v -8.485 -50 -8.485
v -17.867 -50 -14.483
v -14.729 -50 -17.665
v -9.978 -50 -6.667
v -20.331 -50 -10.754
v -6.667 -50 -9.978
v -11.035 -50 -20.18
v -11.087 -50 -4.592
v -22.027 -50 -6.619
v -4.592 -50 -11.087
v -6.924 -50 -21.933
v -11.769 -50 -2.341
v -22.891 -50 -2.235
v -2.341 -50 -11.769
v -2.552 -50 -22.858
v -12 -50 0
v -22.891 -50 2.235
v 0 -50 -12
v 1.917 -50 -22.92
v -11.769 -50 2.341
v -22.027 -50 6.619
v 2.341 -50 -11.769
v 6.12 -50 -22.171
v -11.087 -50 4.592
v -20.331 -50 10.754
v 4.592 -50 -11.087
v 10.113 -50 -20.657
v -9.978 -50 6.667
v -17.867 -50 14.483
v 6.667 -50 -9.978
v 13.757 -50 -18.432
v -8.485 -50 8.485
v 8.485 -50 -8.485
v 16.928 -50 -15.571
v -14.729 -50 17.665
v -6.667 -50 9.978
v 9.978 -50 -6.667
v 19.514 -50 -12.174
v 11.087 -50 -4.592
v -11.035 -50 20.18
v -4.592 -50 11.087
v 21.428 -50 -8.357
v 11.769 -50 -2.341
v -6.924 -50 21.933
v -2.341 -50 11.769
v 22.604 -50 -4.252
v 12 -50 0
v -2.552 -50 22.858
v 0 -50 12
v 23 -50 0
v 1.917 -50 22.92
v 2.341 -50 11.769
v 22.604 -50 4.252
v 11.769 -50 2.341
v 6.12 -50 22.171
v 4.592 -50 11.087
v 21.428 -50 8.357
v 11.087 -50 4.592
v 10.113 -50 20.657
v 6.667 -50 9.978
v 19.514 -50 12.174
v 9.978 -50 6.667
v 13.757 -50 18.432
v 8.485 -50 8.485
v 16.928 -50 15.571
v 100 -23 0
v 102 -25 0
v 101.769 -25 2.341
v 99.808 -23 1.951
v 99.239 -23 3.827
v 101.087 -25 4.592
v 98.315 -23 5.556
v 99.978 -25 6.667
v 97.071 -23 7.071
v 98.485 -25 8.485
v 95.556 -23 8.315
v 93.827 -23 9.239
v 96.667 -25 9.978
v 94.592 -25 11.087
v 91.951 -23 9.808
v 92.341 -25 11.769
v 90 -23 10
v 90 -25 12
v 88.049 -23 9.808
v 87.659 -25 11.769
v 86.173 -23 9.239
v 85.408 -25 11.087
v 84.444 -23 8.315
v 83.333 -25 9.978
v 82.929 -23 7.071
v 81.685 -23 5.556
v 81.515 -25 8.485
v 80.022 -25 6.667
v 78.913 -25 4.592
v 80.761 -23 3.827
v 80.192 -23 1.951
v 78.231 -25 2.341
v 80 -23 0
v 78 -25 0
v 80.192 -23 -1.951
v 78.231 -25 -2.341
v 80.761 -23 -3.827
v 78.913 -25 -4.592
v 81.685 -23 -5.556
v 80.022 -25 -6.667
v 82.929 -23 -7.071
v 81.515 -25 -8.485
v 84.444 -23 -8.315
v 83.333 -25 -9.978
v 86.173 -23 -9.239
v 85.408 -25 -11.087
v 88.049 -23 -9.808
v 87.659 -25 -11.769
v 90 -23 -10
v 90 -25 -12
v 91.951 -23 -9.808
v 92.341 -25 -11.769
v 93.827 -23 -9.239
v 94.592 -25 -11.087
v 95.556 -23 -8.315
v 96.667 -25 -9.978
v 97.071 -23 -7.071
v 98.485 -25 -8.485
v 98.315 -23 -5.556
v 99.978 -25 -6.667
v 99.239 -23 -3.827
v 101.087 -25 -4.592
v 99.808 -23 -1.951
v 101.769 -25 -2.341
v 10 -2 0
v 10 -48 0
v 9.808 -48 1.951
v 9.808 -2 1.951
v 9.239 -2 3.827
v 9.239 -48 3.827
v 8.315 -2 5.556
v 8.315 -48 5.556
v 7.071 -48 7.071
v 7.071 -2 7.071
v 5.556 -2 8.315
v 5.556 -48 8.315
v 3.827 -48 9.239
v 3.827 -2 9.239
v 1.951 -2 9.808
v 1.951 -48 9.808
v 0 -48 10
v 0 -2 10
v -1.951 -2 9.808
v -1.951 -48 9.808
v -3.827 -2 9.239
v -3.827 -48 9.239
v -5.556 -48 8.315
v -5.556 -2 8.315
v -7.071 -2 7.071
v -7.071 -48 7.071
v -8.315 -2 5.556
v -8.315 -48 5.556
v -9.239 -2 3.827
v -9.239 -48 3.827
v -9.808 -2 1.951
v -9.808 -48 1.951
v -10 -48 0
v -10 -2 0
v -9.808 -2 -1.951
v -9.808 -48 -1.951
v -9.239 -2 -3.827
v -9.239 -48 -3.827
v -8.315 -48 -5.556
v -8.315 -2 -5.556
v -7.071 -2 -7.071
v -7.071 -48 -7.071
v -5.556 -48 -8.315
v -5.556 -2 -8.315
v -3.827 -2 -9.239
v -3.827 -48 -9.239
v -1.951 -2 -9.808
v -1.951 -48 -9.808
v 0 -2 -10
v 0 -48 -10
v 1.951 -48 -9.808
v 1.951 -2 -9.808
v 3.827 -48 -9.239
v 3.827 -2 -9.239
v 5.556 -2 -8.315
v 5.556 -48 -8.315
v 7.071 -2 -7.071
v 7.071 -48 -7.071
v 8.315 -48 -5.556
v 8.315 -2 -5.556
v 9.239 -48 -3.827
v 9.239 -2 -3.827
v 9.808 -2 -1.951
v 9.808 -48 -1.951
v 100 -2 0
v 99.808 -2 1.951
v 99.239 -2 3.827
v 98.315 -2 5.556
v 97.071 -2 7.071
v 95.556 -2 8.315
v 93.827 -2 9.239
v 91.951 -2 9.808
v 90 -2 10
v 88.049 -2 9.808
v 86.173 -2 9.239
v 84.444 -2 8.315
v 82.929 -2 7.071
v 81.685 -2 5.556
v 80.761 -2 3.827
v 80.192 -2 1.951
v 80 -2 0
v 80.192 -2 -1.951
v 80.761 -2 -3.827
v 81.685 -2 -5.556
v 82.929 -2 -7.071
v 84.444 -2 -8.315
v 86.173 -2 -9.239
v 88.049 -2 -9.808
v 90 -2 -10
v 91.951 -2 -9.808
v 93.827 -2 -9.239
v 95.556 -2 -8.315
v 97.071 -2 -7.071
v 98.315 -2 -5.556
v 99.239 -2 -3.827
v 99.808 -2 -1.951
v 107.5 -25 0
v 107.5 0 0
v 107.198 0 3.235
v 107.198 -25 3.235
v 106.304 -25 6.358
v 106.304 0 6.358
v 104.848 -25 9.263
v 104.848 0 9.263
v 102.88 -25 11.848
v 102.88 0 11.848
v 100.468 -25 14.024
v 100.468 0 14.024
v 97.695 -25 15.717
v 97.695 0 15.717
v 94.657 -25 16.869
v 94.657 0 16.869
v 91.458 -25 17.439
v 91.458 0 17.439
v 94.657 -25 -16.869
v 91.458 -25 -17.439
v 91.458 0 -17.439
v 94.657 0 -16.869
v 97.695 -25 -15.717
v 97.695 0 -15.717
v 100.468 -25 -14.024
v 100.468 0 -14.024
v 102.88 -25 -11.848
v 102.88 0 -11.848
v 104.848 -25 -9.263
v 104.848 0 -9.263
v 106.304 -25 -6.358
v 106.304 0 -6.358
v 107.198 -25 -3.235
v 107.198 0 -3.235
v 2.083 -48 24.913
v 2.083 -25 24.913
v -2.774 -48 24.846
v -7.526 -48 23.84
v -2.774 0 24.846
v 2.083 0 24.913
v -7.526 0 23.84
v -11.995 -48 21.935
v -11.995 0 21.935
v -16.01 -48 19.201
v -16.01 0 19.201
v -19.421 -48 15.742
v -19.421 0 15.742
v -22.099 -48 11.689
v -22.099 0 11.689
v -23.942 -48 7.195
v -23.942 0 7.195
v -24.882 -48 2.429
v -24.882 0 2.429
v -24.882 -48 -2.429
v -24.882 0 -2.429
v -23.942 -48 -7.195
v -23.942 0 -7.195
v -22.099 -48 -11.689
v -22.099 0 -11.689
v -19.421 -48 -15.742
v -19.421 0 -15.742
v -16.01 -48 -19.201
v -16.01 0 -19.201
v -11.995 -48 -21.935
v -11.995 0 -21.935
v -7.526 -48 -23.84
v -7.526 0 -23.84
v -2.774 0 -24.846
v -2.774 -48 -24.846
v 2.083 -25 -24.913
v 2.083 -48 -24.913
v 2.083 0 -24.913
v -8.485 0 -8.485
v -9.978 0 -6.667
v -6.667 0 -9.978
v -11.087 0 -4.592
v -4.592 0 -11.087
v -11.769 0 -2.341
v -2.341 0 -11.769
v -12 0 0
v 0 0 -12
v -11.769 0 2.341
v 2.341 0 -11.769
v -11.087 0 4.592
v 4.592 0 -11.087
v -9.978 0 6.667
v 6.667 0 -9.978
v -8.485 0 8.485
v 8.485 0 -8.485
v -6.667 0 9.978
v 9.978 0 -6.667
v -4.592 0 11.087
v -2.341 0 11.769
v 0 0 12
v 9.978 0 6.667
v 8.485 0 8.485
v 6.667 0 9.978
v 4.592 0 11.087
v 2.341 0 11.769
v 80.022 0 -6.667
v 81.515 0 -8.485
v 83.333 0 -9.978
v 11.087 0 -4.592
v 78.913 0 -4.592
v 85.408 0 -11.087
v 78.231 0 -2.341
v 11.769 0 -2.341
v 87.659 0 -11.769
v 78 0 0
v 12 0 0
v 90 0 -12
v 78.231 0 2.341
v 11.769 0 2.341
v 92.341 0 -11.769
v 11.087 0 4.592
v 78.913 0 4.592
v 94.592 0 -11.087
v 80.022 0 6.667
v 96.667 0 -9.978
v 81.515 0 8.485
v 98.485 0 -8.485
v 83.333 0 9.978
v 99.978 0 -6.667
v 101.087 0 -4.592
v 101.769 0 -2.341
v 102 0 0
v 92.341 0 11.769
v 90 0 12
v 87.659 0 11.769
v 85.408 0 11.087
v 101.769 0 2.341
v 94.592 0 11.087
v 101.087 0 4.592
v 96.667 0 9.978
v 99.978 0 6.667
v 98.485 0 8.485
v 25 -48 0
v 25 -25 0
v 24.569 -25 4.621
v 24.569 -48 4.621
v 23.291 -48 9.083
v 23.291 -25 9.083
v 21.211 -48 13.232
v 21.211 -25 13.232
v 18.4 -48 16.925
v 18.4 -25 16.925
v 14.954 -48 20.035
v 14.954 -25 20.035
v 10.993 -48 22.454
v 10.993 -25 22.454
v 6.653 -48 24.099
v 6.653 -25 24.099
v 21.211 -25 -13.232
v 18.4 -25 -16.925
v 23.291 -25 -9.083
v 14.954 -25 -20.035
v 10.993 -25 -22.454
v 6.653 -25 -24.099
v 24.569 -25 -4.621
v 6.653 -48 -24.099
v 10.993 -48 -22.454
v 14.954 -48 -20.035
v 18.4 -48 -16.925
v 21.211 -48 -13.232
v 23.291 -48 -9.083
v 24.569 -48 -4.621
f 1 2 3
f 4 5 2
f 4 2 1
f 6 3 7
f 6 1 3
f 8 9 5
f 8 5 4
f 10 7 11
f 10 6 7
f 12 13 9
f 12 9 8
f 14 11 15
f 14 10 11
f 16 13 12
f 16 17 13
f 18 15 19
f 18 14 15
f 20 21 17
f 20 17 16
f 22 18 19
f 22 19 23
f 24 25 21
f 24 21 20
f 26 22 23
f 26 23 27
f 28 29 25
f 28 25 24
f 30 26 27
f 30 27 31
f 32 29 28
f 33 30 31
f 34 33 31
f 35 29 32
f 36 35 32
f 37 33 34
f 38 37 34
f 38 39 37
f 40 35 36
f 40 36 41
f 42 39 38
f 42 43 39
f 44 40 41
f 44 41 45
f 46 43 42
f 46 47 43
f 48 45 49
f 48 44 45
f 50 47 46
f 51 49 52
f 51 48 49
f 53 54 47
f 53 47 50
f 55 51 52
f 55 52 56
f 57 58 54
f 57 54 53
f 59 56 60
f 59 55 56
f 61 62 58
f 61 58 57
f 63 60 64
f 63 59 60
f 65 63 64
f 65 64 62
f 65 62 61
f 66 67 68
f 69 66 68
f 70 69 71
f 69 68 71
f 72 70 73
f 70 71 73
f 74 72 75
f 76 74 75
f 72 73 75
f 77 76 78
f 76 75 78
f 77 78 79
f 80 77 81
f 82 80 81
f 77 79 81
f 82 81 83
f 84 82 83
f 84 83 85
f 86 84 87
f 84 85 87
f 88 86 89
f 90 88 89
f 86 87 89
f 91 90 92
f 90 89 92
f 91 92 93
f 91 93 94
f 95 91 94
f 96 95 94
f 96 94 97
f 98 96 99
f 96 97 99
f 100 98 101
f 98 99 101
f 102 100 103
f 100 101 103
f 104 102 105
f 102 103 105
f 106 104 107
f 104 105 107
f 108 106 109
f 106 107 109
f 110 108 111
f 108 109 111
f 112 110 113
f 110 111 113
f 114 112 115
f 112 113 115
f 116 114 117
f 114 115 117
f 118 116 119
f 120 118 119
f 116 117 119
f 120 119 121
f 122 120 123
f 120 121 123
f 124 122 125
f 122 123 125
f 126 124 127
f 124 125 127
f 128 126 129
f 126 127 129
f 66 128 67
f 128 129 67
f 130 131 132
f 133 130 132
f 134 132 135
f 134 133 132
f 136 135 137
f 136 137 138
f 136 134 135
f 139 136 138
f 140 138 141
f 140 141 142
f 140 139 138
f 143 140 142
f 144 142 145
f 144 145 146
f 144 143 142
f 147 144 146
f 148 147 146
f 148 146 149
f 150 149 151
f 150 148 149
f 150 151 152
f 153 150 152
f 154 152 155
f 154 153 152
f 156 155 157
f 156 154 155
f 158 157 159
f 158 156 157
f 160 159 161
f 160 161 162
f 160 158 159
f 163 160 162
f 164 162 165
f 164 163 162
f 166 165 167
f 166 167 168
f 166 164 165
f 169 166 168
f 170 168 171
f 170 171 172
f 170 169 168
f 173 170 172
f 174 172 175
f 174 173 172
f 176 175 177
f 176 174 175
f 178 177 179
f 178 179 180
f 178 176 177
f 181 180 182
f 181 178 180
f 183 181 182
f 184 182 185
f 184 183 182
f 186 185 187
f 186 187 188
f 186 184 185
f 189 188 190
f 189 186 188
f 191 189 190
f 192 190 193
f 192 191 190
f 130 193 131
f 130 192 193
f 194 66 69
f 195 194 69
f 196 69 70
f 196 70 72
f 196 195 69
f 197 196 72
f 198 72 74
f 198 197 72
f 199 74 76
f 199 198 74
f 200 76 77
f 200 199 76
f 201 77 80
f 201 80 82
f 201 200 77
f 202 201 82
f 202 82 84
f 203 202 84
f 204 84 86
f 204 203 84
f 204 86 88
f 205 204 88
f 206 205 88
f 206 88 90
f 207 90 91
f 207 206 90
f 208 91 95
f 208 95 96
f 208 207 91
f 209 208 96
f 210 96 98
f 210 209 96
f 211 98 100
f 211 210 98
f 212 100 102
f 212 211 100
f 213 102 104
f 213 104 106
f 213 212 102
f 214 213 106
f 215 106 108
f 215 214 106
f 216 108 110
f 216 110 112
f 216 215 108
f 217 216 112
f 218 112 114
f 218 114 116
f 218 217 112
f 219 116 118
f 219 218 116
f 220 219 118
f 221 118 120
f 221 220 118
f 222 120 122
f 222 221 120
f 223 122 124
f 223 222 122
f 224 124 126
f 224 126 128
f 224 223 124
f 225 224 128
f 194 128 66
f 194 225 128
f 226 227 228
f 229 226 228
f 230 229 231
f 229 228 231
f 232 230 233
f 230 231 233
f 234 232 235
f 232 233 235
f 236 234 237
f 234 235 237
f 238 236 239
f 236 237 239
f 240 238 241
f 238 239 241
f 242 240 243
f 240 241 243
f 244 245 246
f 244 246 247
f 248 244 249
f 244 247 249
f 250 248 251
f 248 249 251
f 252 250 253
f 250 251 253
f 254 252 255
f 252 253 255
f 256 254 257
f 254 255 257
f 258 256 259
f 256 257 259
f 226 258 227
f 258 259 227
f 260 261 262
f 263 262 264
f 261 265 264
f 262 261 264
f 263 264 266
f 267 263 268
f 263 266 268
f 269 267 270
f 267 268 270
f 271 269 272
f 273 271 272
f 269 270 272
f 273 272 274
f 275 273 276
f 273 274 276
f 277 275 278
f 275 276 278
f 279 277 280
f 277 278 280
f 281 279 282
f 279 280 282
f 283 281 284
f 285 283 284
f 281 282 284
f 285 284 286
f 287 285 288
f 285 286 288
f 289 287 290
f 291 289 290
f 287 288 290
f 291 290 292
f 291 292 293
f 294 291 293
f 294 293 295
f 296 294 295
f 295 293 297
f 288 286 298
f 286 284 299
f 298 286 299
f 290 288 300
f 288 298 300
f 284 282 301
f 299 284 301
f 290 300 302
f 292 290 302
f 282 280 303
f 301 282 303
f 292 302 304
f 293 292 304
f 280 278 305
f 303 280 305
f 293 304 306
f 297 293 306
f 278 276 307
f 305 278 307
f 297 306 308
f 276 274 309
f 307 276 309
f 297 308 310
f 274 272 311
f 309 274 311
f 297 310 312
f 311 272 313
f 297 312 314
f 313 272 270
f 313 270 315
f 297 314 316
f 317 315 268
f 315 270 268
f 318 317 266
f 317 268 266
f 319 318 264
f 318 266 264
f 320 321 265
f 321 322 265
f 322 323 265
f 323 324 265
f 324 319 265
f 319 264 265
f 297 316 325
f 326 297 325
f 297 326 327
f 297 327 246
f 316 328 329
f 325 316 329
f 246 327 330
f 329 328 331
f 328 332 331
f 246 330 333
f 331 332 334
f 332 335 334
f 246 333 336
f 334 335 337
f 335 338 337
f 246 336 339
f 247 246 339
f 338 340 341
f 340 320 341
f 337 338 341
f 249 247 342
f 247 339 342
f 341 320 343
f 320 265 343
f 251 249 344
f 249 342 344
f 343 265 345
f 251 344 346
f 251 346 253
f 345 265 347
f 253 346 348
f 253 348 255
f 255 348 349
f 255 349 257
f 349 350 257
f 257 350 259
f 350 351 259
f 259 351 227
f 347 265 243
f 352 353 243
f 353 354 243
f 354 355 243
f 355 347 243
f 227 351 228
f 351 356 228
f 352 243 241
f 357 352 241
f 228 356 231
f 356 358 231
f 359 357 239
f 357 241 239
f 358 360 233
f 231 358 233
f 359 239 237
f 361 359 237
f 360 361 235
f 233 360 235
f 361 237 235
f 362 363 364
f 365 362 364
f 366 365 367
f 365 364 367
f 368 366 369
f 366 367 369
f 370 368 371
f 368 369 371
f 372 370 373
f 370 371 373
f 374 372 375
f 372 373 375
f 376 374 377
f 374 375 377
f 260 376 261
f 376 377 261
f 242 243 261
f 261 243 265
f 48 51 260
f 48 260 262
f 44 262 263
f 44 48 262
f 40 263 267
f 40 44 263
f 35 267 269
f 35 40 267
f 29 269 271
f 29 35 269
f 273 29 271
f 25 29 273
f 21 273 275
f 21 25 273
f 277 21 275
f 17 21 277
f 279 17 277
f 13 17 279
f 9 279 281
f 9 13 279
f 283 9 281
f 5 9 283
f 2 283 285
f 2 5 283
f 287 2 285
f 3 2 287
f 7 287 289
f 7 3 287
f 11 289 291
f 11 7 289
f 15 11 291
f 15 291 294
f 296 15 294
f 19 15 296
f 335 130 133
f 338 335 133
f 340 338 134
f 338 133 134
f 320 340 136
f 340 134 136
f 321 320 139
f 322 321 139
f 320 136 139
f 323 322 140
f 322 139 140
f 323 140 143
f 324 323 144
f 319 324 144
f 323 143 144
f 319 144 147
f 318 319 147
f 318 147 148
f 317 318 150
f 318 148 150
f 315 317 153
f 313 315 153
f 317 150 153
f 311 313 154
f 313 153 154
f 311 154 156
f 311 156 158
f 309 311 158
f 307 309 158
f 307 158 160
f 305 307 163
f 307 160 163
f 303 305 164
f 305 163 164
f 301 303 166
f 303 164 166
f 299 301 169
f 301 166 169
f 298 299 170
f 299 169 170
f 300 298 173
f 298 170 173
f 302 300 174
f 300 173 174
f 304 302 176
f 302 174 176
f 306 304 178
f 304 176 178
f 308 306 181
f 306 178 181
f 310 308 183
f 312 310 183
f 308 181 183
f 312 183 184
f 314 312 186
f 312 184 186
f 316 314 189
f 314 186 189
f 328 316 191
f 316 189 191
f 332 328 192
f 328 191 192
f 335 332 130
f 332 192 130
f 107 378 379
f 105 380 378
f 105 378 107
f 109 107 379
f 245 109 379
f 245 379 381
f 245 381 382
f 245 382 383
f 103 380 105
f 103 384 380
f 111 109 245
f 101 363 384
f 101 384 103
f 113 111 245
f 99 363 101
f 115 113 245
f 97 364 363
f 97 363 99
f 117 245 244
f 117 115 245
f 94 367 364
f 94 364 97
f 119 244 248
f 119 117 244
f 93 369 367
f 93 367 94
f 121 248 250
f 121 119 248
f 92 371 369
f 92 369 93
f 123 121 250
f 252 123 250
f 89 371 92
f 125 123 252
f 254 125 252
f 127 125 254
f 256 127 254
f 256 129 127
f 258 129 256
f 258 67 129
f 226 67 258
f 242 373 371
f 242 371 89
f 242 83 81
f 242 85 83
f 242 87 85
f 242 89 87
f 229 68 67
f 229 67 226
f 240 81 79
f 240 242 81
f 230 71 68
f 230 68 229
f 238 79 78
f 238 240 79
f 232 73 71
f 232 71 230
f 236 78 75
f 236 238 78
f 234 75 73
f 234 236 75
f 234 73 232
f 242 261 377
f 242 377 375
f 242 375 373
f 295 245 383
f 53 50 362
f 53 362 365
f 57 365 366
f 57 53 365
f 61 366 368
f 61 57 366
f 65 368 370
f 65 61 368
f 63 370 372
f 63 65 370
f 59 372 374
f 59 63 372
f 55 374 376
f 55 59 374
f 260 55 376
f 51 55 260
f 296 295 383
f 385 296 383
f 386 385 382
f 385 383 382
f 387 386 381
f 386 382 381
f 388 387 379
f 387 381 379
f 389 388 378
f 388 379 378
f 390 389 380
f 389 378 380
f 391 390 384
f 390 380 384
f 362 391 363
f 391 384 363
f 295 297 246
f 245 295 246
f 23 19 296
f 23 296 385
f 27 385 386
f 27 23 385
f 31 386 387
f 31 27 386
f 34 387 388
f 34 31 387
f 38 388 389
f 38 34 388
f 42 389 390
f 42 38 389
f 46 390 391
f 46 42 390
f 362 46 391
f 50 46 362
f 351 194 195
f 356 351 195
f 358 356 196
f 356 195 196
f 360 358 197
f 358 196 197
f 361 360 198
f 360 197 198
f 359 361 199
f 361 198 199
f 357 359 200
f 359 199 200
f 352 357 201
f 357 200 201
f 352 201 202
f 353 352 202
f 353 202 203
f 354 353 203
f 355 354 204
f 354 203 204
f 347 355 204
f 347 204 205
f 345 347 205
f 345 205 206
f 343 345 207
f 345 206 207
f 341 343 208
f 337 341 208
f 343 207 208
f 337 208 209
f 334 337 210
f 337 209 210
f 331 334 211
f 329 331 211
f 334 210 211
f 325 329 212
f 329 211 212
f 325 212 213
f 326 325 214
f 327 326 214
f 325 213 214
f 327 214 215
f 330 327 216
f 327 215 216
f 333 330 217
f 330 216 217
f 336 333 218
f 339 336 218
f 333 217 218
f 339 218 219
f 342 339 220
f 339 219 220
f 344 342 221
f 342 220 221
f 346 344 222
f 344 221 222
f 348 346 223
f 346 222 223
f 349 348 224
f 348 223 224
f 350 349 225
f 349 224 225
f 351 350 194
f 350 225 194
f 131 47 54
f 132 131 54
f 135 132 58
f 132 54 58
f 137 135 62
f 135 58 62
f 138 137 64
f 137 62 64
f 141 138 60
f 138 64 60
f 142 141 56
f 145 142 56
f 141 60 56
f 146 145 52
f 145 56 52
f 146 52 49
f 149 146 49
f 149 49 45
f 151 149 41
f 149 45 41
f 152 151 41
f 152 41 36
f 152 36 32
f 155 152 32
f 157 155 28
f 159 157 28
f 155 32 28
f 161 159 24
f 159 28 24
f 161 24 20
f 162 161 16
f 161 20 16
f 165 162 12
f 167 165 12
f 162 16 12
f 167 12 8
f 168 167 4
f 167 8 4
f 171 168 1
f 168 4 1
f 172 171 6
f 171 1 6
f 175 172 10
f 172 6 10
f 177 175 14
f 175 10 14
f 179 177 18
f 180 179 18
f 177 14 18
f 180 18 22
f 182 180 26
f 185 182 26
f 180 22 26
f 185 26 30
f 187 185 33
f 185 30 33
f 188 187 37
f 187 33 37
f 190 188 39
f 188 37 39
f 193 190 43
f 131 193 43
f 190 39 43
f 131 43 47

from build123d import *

# Parameters (mm, degrees)
F0_R     = 10
F1_DEPTH = 25
F2_DEPTH = 50
F3_SIZE  = 2
F4_SIZE  = 2


with BuildPart() as f1:
    # F0 (on Front) → F1 (new body)
    with BuildSketch(Plane.XZ):
        with BuildLine():
            ThreePointArc((2.083333, -24.913043), (18.399502, -16.92508), (25, 0))
            ThreePointArc((25, 0), (18.399502, 16.92508), (2.083333, 24.913043))
            ThreePointArc((2.083333, 24.913043), (-25, 0), (2.083333, -24.913043))
        make_face()
        Circle(F0_R, mode=Mode.SUBTRACT)
        with BuildLine():
            ThreePointArc((2.083333, 24.913043), (18.399502, 16.92508), (25, 0))
            ThreePointArc((25, 0), (18.399502, -16.92508), (2.083333, -24.913043))
            Line((2.083333, -24.913043), (91.458333, -17.43913))
            ThreePointArc((91.458333, -17.43913), (72.5, 0), (91.458333, 17.43913))
            Line((91.458333, 17.43913), (2.083333, 24.913043))
        make_face()
        with BuildLine():
            ThreePointArc((107.5, 0), (102.879651, 11.847556), (91.458333, 17.43913))
            ThreePointArc((91.458333, 17.43913), (72.5, 0), (91.458333, -17.43913))
            ThreePointArc((91.458333, -17.43913), (102.879651, -11.847556), (107.5, 0))
        make_face()
        with Locations((90, 0)):
            Circle(F0_R, mode=Mode.SUBTRACT)
    extrude(amount=F1_DEPTH)

    # F0 (on Front) → F2 (join)
    with BuildSketch(Plane.XZ):
        with BuildLine():
            ThreePointArc((2.083333, -24.913043), (18.399502, -16.92508), (25, 0))
            ThreePointArc((25, 0), (18.399502, 16.92508), (2.083333, 24.913043))
            ThreePointArc((2.083333, 24.913043), (-25, 0), (2.083333, -24.913043))
        make_face()
        Circle(F0_R, mode=Mode.SUBTRACT)
    extrude(amount=F2_DEPTH)

    # F3
    f3_edges = [f1.edges().sort_by_distance(p)[0] for p in [
        (-2.083333, -50, 24.913043),
        (-10, -50, 0),
        (80, -25, 0),
    ]]
    chamfer(f3_edges, length=F3_SIZE)

    # F4
    f4_edges = [f1.edges().sort_by_distance(p)[0] for p in [
        (-10, 0, 0),
        (80, 0, 0),
    ]]
    chamfer(f4_edges, length=F4_SIZE)


solid = f1.part
